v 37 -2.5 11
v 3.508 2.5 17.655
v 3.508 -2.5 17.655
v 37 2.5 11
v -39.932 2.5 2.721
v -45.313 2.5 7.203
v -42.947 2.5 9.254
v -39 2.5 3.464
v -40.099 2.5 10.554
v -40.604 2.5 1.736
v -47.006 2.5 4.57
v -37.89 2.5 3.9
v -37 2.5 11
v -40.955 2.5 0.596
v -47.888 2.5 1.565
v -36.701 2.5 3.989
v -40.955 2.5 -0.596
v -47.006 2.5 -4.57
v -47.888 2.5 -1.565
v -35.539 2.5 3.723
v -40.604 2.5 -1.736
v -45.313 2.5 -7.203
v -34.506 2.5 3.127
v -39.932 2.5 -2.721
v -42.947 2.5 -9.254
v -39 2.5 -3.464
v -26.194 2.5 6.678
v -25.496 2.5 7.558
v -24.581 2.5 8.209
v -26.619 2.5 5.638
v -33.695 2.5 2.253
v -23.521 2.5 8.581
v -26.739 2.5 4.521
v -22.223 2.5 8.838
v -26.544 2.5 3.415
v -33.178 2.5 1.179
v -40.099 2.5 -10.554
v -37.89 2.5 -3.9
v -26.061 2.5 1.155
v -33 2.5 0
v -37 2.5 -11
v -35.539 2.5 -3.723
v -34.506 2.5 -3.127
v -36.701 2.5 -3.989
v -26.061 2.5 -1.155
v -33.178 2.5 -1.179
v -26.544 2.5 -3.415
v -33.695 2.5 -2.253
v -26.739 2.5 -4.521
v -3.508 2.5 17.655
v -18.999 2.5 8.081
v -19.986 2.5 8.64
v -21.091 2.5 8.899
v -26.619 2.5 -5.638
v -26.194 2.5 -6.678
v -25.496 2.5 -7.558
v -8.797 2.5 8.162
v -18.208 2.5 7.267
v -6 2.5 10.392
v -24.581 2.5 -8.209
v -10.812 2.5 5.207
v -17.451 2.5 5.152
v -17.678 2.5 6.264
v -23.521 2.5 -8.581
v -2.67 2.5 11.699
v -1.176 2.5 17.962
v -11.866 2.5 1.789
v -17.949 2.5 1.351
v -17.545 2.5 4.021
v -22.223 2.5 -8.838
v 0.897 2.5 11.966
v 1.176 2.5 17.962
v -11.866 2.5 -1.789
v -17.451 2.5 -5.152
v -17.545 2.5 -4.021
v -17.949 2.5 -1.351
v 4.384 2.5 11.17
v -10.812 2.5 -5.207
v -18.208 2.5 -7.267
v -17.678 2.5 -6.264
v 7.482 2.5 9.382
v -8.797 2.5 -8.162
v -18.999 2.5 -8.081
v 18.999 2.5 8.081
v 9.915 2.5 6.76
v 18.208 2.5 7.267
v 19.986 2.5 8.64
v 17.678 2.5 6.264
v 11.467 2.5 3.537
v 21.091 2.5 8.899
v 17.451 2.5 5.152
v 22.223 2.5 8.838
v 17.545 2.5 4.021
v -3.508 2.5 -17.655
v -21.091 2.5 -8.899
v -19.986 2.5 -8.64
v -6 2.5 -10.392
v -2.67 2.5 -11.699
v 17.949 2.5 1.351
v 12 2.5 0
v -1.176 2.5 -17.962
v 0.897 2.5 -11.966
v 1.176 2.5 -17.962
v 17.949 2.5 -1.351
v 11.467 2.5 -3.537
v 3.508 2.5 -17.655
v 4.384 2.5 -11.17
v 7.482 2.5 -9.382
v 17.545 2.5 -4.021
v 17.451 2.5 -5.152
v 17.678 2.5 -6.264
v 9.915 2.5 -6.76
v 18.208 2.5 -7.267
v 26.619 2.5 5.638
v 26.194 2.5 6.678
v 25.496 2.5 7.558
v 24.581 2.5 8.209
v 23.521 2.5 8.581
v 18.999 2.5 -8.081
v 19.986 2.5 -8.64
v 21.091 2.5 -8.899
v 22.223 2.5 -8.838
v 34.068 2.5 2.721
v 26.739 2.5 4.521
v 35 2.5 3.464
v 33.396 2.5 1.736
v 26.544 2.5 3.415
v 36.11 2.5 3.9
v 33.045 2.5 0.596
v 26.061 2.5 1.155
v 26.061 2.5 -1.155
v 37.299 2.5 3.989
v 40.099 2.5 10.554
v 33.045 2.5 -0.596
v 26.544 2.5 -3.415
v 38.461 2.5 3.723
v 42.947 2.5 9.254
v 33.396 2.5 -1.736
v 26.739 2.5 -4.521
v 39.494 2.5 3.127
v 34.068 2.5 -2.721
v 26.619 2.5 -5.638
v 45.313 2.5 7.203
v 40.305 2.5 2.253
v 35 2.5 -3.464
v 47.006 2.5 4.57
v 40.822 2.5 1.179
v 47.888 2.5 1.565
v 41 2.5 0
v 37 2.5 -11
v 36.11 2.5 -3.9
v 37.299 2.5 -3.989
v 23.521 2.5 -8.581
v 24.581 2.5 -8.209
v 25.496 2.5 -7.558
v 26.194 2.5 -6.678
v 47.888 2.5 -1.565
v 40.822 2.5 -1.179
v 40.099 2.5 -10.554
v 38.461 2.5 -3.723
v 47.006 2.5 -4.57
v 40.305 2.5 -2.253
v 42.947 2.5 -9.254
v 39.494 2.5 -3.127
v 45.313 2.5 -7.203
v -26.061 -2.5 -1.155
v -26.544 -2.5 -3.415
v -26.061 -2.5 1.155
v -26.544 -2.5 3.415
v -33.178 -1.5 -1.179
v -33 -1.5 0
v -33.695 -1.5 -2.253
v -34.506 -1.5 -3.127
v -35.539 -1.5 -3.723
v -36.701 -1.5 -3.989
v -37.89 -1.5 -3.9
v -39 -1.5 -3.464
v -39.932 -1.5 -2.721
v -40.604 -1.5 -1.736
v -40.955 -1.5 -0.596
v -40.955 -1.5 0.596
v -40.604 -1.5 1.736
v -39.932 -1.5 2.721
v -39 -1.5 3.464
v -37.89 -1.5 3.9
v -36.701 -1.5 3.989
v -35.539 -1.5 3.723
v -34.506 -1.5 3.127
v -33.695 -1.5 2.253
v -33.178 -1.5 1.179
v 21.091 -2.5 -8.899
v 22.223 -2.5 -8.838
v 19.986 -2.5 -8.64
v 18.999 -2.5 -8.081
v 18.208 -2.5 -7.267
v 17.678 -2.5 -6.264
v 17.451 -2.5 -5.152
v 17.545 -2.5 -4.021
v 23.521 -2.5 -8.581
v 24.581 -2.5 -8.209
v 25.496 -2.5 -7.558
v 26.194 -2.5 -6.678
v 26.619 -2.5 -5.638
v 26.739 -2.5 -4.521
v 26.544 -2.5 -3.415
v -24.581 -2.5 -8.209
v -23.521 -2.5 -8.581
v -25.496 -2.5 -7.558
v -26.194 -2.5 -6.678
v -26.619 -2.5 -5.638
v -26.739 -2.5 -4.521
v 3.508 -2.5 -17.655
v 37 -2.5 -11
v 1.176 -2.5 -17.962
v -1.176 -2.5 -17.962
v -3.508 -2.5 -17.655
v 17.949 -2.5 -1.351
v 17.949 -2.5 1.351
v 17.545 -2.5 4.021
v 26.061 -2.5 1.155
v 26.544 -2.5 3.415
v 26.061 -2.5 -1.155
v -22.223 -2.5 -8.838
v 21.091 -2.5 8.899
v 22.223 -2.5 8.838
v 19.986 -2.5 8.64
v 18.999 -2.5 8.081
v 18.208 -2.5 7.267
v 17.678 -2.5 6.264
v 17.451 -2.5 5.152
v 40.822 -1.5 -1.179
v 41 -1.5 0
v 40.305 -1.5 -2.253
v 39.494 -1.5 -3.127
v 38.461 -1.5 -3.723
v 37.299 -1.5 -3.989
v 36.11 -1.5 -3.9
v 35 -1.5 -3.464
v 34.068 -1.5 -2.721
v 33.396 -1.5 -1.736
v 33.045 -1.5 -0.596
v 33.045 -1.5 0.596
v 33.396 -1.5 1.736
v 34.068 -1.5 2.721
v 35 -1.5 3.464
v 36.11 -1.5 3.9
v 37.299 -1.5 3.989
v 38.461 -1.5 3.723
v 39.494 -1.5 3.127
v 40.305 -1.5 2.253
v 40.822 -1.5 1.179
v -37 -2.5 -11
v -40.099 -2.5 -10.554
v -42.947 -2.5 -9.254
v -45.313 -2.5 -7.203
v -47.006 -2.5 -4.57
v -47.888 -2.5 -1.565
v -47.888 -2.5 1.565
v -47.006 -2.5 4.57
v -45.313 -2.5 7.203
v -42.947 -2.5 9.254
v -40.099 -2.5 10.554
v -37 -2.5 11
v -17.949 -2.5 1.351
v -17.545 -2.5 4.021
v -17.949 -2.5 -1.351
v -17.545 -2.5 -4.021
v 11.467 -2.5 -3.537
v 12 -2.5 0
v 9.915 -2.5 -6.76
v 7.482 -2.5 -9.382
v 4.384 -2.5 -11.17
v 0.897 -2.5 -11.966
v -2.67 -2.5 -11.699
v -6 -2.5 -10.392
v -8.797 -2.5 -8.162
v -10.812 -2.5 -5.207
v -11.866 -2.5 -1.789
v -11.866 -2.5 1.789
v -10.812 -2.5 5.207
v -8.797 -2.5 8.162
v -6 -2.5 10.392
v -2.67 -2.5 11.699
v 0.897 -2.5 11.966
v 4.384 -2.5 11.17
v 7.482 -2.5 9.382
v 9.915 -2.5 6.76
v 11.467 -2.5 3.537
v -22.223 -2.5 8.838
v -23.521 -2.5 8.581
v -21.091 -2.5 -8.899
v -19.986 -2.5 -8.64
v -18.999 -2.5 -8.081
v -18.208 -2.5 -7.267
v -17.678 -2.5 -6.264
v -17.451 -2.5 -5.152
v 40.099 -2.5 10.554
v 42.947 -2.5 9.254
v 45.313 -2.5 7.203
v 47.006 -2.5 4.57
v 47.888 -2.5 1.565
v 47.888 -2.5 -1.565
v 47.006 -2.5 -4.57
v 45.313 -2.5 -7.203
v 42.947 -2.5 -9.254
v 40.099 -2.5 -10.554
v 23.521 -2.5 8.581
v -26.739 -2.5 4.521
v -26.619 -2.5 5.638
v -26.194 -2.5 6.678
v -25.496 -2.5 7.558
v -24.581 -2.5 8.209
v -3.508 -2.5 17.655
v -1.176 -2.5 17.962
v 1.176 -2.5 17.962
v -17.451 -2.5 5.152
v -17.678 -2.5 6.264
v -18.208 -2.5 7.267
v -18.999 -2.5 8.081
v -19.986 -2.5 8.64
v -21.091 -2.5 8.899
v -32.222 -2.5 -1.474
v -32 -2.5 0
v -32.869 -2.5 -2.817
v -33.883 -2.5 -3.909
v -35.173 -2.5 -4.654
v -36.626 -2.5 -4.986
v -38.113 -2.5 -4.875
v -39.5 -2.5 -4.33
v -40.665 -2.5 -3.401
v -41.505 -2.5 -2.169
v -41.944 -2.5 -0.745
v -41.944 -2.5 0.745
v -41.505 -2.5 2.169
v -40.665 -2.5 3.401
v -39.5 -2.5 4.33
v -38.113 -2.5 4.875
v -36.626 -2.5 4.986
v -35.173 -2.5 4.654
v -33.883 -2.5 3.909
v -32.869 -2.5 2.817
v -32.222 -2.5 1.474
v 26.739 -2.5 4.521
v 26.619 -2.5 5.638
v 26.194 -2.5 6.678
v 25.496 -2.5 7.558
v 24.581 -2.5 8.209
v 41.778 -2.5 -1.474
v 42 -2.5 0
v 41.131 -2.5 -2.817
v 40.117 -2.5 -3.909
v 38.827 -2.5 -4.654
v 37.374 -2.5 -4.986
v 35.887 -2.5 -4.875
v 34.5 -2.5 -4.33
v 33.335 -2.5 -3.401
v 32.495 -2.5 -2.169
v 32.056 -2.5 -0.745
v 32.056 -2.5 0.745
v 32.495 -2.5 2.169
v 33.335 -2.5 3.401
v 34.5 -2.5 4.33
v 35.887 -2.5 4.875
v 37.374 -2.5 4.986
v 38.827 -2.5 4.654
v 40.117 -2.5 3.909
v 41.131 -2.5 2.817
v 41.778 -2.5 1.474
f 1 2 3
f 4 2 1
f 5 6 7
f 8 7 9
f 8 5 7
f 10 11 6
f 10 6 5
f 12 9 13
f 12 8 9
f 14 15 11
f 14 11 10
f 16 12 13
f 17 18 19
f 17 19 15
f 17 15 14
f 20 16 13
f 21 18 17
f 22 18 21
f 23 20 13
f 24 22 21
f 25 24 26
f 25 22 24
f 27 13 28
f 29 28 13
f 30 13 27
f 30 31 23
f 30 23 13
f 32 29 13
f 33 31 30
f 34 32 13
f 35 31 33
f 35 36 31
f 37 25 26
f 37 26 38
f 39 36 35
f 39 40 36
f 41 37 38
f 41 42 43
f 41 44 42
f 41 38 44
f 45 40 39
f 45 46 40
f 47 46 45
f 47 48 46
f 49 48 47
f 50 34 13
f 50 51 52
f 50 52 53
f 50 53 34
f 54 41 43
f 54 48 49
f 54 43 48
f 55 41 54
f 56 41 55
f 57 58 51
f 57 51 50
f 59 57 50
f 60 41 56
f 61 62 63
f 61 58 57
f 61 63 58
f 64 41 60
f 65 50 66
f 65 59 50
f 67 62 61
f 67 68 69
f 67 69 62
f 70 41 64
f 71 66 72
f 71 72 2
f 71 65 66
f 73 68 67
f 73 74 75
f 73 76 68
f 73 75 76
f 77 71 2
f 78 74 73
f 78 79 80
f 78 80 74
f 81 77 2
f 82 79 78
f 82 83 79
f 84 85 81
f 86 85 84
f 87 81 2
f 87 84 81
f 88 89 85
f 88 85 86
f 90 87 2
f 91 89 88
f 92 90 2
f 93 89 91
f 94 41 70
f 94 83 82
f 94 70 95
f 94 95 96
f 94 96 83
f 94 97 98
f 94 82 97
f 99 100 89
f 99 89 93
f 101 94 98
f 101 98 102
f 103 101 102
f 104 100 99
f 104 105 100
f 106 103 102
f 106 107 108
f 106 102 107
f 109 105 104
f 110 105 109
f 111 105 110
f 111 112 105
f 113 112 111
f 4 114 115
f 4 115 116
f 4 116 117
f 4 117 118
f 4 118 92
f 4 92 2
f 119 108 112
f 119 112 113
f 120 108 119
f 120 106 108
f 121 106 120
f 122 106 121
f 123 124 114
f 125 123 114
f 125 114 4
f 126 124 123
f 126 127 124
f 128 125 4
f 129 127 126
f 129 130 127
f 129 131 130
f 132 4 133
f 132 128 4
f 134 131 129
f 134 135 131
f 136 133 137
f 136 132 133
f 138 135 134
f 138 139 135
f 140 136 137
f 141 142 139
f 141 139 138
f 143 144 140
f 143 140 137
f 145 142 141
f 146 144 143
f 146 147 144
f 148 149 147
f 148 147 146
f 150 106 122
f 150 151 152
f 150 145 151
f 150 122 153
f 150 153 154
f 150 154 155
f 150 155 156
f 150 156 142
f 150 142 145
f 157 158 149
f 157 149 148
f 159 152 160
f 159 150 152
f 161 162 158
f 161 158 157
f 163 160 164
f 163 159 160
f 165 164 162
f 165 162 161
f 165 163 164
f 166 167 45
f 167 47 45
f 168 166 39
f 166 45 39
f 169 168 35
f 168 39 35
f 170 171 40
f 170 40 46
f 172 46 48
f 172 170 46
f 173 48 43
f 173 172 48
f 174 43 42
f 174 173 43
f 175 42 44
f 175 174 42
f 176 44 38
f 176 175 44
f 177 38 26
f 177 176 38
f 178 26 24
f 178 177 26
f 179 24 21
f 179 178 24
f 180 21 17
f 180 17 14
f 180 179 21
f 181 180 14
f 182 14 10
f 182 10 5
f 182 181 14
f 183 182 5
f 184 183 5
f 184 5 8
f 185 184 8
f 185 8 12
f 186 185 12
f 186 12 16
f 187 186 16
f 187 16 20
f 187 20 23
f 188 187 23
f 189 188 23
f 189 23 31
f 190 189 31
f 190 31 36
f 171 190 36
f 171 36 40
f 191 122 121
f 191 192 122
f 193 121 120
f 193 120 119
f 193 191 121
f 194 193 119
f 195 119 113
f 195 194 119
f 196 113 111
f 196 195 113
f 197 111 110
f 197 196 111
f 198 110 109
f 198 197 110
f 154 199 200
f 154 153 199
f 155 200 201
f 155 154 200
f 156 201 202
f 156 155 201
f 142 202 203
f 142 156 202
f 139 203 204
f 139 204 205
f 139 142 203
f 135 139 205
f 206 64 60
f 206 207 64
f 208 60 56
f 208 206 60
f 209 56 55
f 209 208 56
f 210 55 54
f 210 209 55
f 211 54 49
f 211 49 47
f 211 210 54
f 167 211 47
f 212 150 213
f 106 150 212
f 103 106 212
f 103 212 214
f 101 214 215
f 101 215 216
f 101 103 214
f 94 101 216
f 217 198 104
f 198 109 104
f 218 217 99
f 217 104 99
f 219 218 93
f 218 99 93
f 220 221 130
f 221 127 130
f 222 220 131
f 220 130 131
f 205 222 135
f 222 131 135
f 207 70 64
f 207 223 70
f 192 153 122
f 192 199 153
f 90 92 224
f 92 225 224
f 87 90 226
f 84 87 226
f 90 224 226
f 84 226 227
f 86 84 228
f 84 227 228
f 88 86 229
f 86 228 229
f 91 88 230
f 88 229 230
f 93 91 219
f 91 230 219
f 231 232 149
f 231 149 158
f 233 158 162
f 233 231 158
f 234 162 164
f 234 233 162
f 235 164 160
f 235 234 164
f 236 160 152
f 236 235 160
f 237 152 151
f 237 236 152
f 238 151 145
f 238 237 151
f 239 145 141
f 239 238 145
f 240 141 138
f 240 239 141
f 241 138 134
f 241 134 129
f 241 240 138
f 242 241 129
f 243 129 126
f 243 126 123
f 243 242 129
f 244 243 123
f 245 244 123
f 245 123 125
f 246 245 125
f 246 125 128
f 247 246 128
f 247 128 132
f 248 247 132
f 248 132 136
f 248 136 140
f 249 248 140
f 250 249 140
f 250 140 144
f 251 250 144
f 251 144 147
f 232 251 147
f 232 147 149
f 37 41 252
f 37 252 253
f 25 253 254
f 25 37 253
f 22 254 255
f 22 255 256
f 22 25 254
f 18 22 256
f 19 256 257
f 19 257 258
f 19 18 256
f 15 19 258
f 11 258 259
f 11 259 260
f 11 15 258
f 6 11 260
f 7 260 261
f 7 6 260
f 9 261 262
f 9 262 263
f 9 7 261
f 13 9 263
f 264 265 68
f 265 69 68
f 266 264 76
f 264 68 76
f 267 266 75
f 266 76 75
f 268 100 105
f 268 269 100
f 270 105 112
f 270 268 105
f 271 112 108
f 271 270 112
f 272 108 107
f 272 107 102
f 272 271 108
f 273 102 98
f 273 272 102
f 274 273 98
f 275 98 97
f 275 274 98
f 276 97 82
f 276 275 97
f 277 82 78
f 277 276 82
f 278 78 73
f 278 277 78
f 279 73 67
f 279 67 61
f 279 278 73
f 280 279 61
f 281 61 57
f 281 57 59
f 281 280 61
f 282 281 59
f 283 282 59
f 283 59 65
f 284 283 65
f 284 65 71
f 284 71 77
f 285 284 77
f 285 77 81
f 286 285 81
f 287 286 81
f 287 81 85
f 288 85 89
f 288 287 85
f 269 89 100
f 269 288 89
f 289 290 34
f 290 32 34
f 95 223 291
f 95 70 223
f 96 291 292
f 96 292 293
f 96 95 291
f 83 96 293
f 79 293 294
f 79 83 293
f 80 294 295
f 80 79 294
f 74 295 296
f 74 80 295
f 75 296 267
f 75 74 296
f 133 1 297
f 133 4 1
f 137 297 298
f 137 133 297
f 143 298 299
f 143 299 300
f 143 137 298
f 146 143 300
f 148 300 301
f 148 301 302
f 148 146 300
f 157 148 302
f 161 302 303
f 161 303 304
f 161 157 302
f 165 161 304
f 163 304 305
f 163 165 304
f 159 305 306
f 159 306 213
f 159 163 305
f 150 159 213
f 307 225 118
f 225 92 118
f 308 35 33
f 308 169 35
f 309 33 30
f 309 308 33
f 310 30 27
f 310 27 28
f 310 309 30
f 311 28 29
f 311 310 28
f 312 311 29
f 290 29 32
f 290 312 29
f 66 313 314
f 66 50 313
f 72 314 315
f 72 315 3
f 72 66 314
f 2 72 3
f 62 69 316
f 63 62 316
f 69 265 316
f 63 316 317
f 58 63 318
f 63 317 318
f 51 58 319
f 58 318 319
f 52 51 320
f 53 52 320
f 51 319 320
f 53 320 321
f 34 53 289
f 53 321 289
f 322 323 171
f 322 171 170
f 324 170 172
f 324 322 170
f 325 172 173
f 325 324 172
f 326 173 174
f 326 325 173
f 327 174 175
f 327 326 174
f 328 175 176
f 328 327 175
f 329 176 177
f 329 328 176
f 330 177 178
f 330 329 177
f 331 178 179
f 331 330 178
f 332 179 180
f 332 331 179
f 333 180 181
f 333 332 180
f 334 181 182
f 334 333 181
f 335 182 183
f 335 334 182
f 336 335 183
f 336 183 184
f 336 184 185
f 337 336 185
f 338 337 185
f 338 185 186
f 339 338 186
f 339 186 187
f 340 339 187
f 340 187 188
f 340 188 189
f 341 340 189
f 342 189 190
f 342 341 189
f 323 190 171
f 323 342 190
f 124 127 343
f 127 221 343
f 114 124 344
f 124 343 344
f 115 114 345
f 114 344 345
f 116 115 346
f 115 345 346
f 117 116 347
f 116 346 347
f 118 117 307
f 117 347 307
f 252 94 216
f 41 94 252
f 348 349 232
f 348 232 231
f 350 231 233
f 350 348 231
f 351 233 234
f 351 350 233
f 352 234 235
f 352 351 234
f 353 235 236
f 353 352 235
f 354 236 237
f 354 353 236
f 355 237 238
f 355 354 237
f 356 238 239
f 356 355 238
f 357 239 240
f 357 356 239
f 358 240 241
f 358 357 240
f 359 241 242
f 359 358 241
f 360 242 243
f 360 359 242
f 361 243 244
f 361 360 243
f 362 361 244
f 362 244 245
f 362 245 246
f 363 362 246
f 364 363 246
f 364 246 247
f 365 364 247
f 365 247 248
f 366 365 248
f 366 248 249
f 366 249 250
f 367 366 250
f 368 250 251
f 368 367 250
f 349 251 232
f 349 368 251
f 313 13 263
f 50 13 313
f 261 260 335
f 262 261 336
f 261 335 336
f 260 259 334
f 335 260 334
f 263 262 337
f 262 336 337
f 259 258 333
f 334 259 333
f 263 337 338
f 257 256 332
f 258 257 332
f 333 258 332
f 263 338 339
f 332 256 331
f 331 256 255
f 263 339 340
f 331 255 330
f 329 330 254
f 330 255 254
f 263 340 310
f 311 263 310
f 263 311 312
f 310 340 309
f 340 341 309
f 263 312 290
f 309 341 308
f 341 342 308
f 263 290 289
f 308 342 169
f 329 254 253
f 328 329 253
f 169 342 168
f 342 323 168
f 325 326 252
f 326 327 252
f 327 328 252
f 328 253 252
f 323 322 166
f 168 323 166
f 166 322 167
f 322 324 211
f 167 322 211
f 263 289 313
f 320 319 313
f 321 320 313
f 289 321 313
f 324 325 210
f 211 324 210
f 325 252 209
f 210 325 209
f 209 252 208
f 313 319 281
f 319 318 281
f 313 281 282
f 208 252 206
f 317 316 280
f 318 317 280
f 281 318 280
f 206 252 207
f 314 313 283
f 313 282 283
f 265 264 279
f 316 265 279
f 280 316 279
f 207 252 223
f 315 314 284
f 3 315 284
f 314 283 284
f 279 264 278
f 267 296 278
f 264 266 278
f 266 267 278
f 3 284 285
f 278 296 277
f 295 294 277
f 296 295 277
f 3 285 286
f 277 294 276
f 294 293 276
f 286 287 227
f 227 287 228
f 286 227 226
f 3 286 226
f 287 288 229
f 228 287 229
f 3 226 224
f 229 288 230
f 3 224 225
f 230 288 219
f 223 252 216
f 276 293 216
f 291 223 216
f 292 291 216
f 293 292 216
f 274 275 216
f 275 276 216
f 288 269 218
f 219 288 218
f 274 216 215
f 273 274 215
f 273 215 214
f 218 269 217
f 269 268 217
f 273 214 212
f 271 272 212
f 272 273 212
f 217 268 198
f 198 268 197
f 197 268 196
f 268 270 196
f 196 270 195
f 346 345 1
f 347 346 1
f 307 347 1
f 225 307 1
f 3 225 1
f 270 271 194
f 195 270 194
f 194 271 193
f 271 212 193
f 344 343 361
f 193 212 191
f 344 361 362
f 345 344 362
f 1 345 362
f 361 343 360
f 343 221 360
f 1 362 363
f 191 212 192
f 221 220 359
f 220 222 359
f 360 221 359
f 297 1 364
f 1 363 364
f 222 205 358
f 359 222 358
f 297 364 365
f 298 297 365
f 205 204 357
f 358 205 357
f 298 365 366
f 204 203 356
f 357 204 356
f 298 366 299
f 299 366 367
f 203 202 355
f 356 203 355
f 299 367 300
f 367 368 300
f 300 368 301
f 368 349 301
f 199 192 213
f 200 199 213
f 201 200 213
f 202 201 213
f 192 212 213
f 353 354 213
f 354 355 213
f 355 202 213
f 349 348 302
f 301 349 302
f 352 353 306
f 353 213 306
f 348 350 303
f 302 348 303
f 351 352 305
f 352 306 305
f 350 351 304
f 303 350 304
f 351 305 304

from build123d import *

# Parameters (mm, degrees)
SKETCH1_R           = 4
SKETCH1_R_2         = 12
BOSS_EXTRUDE1_DEPTH = 2.5
FILLET1_R           = 4
CHAMFER1_SIZE       = 1


with BuildPart() as part:
    # Sketch1 → Boss-Extrude1 (new body, symmetric)
    with BuildSketch(Plane(origin=(0, 0, 0), x_dir=(1, 0, 0), z_dir=(0, 1, 0))):
        with BuildLine():
            Line((37, 11), (3.508016814, 17.654852535))
            ThreePointArc((3.508016814, 17.654852535), (0, 18), (-3.508016814, 17.654852535))
            Line((-3.508016814, 17.654852535), (-37, 11))
            ThreePointArc((-37, 11), (-48, 0), (-37, -11))
            Line((-37, -11), (-3.508016814, -17.654852535))
            ThreePointArc((-3.508016814, -17.654852535), (0, -18), (3.508016814, -17.654852535))
            Line((3.508016814, -17.654852535), (37, -11))
            ThreePointArc((37, -11), (48, 0), (37, 11))
        make_face()
        with Locations((37, 0)):
            Circle(SKETCH1_R, mode=Mode.SUBTRACT)
        with Locations((-37, 0)):
            Circle(SKETCH1_R, mode=Mode.SUBTRACT)
        Circle(SKETCH1_R_2, mode=Mode.SUBTRACT)
        with BuildLine():
            Line((-28.954155956, -7.500959513), (-14.744742226, -10.324368102))
            ThreePointArc((-14.744742226, -10.324368102), (-18, 0), (-14.744742226, 10.324368102))
            Line((-14.744742226, 10.324368102), (-28.954155956, 7.500959513))
            ThreePointArc((-28.954155956, 7.500959513), (-26, 0), (-28.954155956, -7.500959513))
        make_face(mode=Mode.SUBTRACT)
        with BuildLine():
            ThreePointArc((14.744742226, 10.324368102), (18, 0), (14.744742226, -10.324368102))
            Line((14.744742226, -10.324368102), (28.954155956, -7.500959513))
            ThreePointArc((28.954155956, -7.500959513), (26, 0), (28.954155956, 7.500959513))
            Line((28.954155956, 7.500959513), (14.744742226, 10.324368102))
        make_face(mode=Mode.SUBTRACT)
    extrude(amount=BOSS_EXTRUDE1_DEPTH, both=True)

    # Fillet1
    fillet1_edges = [part.edges().sort_by_distance(p)[0] for p in [
        (14.744742226, 0, 10.324368102),
        (28.954155956, 0, 7.500959513),
        (28.954155956, 0, -7.500959513),
        (14.744742226, 0, -10.324368102),
        (-14.744742226, 0, 10.324368102),
        (-14.744742226, 0, -10.324368102),
        (-28.954155956, 0, -7.500959513),
        (-28.954155956, 0, 7.500959513),
    ]]
    fillet(fillet1_edges, radius=FILLET1_R)

    # Chamfer1
    chamfer1_edges = [part.edges().sort_by_distance(p)[0] for p in [
        (-41, -2.5, 0),
        (33, -2.5, 0),
    ]]
    chamfer(chamfer1_edges, length=CHAMFER1_SIZE)


solid = part.part
